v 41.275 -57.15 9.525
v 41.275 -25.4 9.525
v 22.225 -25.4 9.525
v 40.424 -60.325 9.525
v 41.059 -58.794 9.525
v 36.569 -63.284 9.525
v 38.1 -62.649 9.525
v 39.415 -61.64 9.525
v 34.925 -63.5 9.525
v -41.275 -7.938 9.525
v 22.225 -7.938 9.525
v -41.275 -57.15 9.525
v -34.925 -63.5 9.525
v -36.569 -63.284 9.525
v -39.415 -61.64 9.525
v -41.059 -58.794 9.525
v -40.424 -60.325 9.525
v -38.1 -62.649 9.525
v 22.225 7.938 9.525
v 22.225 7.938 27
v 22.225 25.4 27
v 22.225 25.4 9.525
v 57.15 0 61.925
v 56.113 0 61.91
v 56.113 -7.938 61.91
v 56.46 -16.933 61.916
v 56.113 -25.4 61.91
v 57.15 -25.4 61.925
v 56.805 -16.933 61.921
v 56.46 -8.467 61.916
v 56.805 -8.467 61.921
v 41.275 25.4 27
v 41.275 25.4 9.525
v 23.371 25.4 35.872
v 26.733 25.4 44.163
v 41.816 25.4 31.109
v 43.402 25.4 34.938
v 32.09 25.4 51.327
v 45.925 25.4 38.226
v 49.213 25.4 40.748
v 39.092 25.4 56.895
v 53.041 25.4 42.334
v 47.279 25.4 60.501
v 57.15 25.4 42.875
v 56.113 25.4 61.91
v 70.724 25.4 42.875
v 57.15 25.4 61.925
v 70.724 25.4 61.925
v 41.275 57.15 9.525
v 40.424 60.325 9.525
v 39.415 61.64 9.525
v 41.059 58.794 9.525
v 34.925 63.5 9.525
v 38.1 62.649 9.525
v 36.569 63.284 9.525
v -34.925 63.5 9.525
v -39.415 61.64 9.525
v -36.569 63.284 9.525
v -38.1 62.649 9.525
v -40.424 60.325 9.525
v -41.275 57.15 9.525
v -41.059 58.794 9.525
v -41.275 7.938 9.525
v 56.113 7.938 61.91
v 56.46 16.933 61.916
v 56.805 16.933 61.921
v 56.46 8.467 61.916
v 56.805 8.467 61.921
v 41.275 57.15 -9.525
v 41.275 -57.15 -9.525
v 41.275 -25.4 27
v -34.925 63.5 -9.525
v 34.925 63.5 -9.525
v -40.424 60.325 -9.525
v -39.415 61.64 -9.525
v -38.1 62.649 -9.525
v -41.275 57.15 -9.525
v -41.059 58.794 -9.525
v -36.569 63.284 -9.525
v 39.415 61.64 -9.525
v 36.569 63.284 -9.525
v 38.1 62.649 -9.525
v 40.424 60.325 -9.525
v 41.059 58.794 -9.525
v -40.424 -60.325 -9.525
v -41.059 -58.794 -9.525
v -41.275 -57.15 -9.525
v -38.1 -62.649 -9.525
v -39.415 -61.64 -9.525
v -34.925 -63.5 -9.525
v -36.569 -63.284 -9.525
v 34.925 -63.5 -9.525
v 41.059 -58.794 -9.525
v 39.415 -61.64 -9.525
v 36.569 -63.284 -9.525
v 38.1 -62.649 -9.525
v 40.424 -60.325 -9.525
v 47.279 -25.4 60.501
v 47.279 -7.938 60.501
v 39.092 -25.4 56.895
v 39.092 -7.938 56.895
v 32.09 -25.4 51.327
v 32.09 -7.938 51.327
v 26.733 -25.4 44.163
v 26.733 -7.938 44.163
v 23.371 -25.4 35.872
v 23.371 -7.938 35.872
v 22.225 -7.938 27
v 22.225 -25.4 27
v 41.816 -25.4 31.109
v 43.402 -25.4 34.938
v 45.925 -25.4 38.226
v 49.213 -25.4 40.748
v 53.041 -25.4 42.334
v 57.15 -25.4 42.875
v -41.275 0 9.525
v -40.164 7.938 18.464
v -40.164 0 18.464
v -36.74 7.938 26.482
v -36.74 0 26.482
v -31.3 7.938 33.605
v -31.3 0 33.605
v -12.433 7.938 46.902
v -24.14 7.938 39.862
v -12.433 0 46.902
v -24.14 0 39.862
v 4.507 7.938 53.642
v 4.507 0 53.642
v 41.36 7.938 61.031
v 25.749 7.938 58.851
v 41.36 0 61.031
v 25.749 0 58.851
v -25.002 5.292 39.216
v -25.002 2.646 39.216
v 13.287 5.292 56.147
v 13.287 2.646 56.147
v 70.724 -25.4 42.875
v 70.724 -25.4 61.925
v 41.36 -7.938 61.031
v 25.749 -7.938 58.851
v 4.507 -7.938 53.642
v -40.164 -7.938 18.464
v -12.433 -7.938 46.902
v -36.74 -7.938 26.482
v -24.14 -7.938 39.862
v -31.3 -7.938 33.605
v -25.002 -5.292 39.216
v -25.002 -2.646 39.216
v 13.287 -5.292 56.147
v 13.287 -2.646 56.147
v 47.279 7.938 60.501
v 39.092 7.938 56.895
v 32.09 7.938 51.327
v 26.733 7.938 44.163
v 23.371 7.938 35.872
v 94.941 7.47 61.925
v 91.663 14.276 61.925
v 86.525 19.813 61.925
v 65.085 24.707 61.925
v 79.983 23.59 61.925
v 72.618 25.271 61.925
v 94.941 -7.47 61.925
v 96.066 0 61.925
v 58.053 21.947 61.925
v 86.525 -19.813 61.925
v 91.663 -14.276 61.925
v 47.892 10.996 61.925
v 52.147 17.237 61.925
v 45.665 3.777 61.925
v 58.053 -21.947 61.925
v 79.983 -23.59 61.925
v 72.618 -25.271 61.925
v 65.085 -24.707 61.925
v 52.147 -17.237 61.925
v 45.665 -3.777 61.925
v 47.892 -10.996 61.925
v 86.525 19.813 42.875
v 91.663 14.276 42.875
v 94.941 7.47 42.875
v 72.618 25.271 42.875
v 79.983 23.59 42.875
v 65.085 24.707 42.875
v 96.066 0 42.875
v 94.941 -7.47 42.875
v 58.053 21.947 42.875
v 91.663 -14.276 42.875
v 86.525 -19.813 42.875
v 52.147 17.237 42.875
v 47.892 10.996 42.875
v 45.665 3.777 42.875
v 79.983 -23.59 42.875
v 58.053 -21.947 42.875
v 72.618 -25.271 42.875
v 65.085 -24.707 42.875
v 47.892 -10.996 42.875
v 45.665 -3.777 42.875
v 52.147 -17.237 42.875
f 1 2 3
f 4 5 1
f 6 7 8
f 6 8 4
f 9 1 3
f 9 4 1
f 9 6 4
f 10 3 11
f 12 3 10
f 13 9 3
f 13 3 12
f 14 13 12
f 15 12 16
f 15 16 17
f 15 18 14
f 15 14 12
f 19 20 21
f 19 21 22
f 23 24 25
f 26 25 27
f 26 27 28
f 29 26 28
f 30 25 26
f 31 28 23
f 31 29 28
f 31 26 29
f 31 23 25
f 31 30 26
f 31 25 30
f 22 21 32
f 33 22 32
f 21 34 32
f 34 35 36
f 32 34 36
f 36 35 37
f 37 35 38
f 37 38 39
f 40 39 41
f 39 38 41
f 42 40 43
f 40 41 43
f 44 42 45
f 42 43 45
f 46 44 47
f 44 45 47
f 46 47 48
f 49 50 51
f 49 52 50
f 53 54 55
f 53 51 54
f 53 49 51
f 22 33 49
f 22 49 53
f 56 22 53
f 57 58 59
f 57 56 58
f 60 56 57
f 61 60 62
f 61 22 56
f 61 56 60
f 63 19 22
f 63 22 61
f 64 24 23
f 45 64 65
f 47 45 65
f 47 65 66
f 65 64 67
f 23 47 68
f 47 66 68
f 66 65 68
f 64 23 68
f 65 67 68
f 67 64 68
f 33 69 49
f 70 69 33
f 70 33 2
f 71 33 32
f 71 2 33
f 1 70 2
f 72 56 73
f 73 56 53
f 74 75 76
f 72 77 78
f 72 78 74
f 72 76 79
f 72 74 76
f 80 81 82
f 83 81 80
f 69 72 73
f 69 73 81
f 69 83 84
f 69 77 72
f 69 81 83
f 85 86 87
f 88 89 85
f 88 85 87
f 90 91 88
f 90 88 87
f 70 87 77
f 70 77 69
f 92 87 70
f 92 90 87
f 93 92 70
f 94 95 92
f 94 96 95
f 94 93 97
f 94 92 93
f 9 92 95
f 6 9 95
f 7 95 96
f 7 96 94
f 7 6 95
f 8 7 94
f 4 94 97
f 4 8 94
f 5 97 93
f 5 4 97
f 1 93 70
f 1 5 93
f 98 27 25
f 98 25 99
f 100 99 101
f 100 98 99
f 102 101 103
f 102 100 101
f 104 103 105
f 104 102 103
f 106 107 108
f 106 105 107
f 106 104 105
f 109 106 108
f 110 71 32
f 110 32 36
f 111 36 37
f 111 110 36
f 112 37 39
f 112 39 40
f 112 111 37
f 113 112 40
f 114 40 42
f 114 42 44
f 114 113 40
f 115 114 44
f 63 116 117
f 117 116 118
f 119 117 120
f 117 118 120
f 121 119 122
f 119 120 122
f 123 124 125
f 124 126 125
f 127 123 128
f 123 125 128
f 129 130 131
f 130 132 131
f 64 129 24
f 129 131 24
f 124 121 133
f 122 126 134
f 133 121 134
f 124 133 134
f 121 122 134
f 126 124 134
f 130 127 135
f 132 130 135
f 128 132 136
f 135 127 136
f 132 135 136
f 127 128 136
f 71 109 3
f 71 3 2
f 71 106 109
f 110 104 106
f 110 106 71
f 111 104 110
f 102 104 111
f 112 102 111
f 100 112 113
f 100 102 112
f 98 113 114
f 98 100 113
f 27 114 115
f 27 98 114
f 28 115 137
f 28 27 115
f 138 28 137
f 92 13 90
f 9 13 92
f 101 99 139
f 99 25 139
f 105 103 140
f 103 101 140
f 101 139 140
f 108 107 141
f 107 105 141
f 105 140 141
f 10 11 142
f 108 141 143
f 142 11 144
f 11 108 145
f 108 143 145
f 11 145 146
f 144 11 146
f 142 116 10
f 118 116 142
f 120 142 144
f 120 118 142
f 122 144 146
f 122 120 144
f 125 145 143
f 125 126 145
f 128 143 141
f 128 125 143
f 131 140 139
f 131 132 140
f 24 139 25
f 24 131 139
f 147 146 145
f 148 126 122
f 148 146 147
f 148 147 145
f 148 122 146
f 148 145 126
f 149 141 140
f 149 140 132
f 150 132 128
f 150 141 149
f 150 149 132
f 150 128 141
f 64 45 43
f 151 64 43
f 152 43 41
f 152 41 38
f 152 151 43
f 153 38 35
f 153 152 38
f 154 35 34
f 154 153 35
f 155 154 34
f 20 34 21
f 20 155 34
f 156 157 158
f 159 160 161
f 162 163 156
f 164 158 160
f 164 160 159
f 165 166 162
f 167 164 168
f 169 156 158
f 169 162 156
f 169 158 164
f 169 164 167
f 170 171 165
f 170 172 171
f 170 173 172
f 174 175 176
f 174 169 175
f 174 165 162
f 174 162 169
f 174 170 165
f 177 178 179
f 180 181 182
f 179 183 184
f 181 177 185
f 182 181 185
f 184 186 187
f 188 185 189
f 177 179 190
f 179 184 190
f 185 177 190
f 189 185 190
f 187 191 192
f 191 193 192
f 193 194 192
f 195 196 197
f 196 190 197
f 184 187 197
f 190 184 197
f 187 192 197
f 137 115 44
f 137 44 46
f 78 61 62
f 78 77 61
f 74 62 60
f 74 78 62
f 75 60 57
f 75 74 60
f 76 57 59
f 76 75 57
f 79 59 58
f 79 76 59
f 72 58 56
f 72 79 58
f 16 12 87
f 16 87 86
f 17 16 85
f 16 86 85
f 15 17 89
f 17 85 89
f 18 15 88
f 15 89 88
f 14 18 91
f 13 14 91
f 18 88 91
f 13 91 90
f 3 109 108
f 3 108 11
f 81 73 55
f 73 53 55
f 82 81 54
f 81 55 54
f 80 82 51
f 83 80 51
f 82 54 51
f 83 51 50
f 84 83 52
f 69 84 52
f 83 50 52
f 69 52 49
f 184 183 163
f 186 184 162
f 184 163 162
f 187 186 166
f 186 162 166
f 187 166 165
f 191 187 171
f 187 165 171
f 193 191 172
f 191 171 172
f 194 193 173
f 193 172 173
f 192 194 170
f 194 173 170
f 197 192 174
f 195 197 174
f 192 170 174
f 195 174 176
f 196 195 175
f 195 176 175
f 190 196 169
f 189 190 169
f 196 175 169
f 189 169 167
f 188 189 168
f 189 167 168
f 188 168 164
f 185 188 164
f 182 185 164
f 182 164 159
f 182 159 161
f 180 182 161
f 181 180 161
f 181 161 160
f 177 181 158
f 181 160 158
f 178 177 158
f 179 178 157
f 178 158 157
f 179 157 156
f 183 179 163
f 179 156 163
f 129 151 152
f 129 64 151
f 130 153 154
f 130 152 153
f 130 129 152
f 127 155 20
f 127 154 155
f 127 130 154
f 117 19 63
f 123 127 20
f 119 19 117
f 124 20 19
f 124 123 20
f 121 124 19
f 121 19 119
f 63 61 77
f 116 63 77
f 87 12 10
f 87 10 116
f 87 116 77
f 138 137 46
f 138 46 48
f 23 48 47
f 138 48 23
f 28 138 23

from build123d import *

# Parameters (mm, degrees)
F1_DEPTH = 63.5
F2_DEPTH = 25.4
F3_DEPTH = 7.9375
F0_W     = 25.3422030224
F0_H     = 19.05
F5_R     = 6.35


with BuildPart() as f1:
    # F0 (on Front) → F1 (new body, symmetric)
    with BuildSketch(Plane.XZ):
        Polygon((22.225, 9.525), (-41.275, 9.525), (-41.275, -9.525), (41.275, -9.525), (41.275, 9.525), align=None)
    extrude(amount=F1_DEPTH, both=True)

    # F0 (on Front) → F2 (join, symmetric)
    with BuildSketch(Plane.XZ):
        with BuildLine():
            Line((22.225, 27.0002), (22.225, 9.525))
            Line((22.225, 9.525), (41.275, 9.525))
            Line((41.275, 9.525), (41.275, 27.0002))
            ThreePointArc((41.275, 27.0002), (45.9246798487, 38.2255201513), (57.15, 42.8752))
            Line((57.15, 42.8752), (70.7242196436, 42.8752))
            Line((70.7242196436, 42.8752), (70.7242196436, 61.9252))
            Line((70.7242196436, 61.9252), (57.15, 61.9252))
            add(Edge.make_bspline(
                [(56.1133910245, 61.9098128141), (56.4604619677, 61.9160628515), (56.8060163953, 61.9211902678), (57.15, 61.9252)],
                knots=[110.5276515359, 110.5276515359, 110.5276515359, 110.5276515359, 111.5045361635, 111.5045361635, 111.5045361635, 111.5045361635], degree=3))
            ThreePointArc((56.1133910245, 61.9098128141), (32.0904789205, 51.326647095), (22.225, 27.0002))
        make_face()
    extrude(amount=F2_DEPTH, both=True)

    # F0 (on Front) → F3 (join, symmetric)
    with BuildSketch(Plane.XZ):
        with BuildLine():
            add(Edge.make_bspline(
                [(-41.275, 9.525), (-41.8373266666, 46.1244678673), (16.8447453968, 61.2026648778), (56.1133910245, 61.9098128141)],
                knots=[0, 0, 0, 0, 110.5276515359, 110.5276515359, 110.5276515359, 110.5276515359], degree=3))
            Line((-41.275, 9.525), (22.225, 9.525))
            Line((22.225, 9.525), (22.225, 27.0002))
            ThreePointArc((22.225, 27.0002), (32.0904789205, 51.326647095), (56.1133910245, 61.9098128141))
        make_face()
    extrude(amount=F3_DEPTH, both=True)

    # F5
    f5_edges = [f1.edges().sort_by_distance(p)[0] for p in [
        (41.275, -63.5, 0),
        (41.275, 63.5, 0),
        (-41.275, -63.5, 0),
        (-41.275, 63.5, 0),
    ]]
    fillet(f5_edges, radius=F5_R)


with BuildPart() as f4:
    # F0 (on Front) → F4 (revolve)
    with BuildSketch(Plane.XZ):
        with Locations((83.3953211548, 52.4002)):
            Rectangle(F0_W, F0_H)
    revolve(axis=Axis((70.7242196436, 0, 52.3875), (0, 0, -1)))


solid = Compound([f1.part, f4.part])
